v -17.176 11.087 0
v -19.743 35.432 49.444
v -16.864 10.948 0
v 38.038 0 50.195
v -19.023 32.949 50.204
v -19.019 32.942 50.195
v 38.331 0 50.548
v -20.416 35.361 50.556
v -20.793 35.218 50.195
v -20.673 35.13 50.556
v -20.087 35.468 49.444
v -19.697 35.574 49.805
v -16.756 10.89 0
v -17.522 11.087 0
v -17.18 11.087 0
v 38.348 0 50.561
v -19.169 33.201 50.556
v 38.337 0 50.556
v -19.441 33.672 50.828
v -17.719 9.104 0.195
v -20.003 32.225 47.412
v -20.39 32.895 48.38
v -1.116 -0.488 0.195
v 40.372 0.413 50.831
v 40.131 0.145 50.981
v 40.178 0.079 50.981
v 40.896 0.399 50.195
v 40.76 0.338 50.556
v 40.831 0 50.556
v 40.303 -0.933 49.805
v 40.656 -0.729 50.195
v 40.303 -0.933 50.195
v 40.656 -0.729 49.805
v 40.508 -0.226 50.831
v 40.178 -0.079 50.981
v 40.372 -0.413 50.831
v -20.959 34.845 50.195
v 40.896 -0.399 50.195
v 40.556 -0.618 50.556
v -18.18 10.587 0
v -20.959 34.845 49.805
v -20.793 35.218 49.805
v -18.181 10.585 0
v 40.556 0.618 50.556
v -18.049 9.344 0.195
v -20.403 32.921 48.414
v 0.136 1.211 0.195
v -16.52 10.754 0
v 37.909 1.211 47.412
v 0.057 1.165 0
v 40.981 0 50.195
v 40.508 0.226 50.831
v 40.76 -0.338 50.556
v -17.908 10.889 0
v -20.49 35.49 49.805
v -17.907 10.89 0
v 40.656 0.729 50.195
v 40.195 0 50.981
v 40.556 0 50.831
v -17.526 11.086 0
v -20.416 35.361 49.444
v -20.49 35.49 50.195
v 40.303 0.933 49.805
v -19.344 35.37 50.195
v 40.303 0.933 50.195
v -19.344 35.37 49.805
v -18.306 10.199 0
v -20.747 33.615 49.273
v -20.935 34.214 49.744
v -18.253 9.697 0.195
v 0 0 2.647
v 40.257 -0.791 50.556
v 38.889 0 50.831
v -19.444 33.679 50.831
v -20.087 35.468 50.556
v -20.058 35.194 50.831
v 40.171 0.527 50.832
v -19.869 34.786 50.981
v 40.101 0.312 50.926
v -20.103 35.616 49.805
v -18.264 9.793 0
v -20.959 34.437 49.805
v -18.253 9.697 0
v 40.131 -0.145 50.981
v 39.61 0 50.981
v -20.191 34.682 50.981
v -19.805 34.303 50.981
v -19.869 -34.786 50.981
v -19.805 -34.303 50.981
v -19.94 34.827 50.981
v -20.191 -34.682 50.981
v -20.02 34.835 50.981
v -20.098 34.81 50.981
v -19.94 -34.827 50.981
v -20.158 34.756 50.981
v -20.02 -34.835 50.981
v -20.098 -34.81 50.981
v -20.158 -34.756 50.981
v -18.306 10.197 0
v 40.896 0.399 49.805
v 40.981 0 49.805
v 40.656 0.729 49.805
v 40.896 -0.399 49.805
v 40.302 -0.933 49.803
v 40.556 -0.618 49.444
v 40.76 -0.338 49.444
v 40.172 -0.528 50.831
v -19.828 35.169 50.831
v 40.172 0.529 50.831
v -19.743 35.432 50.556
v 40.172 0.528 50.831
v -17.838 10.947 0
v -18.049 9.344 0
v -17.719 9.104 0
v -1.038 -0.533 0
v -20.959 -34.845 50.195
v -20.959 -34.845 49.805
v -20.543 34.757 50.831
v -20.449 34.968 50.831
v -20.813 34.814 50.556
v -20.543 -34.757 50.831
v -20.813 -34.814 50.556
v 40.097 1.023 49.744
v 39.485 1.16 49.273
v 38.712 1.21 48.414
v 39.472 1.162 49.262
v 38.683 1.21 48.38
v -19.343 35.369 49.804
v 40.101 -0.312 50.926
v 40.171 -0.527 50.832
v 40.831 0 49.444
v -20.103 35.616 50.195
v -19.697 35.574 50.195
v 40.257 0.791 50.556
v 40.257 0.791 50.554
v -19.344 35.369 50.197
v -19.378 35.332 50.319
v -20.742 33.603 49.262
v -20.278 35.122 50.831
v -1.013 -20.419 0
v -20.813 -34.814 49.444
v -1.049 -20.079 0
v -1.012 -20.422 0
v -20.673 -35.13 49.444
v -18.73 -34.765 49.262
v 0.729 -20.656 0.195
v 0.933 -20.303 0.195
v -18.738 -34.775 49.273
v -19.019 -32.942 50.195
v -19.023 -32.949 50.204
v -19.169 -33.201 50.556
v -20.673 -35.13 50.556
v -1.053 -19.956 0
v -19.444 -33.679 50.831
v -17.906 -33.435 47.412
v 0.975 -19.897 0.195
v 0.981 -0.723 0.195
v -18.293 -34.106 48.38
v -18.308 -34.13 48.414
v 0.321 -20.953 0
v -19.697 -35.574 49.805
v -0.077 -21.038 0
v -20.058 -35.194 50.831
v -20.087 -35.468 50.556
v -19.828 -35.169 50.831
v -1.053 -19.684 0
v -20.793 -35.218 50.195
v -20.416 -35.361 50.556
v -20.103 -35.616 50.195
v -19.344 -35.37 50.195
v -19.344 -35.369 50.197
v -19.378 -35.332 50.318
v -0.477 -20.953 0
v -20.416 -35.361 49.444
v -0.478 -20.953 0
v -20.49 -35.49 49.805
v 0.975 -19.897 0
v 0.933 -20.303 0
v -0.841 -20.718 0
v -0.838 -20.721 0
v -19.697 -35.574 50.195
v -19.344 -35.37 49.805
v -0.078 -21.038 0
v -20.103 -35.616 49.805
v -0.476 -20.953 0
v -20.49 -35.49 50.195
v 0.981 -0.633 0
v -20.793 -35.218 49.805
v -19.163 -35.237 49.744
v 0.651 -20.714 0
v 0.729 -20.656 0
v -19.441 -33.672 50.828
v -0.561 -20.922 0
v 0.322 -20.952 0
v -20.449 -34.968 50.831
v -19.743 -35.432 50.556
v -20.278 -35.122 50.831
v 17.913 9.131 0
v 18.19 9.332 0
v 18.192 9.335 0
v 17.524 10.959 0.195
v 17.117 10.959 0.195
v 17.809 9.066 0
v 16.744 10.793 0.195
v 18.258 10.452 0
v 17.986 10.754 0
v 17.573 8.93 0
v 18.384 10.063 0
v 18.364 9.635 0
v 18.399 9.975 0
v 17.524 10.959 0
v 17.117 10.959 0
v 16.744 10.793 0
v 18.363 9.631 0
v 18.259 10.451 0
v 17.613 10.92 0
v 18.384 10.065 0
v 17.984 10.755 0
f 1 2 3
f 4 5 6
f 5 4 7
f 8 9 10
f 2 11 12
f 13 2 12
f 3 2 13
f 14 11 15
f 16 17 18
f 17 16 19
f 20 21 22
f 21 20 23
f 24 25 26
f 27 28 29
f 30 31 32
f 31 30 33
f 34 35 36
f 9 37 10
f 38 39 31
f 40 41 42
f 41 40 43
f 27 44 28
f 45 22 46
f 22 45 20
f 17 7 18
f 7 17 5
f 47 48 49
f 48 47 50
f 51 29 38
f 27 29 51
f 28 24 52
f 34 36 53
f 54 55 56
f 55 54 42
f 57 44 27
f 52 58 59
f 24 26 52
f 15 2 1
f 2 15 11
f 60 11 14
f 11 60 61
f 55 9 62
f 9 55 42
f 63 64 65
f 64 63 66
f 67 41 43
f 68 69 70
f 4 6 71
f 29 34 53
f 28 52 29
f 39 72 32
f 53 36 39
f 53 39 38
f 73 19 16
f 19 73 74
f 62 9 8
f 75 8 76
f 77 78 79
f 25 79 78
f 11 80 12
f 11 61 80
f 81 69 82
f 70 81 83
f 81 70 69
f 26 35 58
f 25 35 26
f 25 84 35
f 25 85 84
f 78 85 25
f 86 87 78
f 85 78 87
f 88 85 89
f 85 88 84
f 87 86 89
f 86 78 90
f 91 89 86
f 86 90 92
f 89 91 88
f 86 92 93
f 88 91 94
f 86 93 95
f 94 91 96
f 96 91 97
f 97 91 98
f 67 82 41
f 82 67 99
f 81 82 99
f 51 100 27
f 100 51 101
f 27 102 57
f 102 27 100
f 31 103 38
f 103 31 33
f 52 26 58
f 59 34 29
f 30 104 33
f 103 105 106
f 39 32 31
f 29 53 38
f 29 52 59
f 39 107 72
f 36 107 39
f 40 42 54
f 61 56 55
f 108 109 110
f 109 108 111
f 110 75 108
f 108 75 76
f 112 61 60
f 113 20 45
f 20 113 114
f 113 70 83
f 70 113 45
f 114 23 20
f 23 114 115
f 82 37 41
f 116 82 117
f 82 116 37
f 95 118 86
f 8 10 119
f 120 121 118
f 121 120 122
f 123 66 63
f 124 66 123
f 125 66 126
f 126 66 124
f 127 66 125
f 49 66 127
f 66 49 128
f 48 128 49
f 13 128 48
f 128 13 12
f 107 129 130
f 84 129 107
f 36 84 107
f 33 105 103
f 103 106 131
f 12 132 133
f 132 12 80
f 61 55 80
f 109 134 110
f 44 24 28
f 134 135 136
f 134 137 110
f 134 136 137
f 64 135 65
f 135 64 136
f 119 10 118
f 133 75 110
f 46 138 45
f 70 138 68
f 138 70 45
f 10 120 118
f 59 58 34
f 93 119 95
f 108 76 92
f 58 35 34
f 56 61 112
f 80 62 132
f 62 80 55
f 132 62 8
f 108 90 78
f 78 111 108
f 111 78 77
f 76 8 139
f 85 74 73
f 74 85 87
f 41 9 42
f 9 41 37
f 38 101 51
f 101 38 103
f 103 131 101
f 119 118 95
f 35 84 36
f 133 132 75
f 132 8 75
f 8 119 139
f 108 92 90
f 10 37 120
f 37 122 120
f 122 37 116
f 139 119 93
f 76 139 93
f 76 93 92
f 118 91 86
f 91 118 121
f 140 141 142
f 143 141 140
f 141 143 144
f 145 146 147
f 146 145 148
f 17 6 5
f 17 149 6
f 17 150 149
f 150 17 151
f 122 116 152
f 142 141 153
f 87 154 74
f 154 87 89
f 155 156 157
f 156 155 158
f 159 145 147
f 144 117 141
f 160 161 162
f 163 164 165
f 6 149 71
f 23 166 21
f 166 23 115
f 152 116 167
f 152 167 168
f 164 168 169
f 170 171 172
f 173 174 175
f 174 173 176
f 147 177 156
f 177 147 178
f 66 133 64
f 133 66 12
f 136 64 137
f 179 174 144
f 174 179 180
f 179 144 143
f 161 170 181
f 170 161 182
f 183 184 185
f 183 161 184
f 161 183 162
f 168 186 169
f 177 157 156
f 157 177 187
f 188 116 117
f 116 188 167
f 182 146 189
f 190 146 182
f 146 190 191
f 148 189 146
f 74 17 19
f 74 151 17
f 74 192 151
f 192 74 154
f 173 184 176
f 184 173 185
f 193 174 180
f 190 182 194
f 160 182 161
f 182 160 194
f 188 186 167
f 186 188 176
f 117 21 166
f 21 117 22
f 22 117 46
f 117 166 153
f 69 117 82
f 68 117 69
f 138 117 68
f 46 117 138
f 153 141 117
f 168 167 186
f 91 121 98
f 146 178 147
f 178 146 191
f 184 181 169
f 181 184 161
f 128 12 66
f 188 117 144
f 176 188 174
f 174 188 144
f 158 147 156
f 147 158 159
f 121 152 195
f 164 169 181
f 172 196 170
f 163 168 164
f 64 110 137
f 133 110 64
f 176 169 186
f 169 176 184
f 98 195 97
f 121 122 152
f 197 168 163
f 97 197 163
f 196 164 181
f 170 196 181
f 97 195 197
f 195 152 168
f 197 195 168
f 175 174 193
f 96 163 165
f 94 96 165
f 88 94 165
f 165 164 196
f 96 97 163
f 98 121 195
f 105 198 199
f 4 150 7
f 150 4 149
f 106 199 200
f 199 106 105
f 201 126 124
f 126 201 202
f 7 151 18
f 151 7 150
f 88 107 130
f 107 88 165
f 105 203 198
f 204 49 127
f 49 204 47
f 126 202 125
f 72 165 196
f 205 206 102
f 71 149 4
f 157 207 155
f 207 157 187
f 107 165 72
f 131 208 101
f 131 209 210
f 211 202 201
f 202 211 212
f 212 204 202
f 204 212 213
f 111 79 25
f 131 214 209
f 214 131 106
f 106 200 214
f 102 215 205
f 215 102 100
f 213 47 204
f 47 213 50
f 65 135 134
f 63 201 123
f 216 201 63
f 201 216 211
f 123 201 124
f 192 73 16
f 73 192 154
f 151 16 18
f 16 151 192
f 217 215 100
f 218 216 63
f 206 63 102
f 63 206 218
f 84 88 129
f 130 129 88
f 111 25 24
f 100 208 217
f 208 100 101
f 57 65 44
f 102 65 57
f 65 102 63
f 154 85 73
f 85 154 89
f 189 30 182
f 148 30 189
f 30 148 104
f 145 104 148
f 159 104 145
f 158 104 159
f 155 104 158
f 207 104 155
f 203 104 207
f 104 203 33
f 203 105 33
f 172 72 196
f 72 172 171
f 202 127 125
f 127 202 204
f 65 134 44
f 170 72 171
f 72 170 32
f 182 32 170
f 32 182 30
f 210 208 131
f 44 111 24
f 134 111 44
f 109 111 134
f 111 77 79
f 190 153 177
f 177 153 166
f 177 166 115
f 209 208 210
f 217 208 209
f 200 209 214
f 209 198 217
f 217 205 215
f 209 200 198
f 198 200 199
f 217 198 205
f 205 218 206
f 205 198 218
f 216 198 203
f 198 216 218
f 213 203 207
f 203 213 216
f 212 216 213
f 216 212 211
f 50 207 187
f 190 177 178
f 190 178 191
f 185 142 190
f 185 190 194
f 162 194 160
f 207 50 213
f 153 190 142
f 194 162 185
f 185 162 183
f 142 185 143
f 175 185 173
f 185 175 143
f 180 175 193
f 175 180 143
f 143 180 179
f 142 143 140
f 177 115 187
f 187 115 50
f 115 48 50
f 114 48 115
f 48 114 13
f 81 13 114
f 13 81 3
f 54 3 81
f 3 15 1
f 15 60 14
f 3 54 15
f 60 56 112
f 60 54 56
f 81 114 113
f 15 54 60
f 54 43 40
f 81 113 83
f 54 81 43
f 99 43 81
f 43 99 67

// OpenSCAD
/* parametric Delta vase inspired by 
   http://www.thingiverse.com/thing:150482
   from the original design by Mart van Schijndel

   generaised to n sides

   Each side is constructed by hulling spheres positioned 
   at the corners of the plane of the face.  Three of the
   points are straightforward to position but the fourth
   needs to be placed so that the bottom edge is parallel
   to the top edge,
*/
 
// length of top edge
top=40;
// length of bottom edge
bottom=20;
// height of vase
height=50;
// wall thickness
thickness=1;
// number of sides
nsides=3;

module side(angle,top,bottom,height,thickness) {
   hull() {
        translate([top,0,height]) sphere(thickness);  
        rotate([0,0,angle])
            translate([top,0,height]) sphere(thickness);
        translate([0,0,0]) sphere(thickness);
        rotate([0,0,angle+(180-angle)/2])
            translate([bottom,0,0]) sphere(thickness);
    }
}

module delta_vase(nsides,top,bottom,height,thickness) {
    assign(angle=360/nsides)
    for (i = [0:nsides-1])
      rotate([0,0,i*angle])
         side(angle,top,bottom,height,thickness);
}

module ground(size=50) {
   translate([0,0,-size]) cube(2*size,center=true);
}

$fn=15;

difference()  {
  delta_vase(nsides,top,bottom,height,thickness);
  ground();
}
